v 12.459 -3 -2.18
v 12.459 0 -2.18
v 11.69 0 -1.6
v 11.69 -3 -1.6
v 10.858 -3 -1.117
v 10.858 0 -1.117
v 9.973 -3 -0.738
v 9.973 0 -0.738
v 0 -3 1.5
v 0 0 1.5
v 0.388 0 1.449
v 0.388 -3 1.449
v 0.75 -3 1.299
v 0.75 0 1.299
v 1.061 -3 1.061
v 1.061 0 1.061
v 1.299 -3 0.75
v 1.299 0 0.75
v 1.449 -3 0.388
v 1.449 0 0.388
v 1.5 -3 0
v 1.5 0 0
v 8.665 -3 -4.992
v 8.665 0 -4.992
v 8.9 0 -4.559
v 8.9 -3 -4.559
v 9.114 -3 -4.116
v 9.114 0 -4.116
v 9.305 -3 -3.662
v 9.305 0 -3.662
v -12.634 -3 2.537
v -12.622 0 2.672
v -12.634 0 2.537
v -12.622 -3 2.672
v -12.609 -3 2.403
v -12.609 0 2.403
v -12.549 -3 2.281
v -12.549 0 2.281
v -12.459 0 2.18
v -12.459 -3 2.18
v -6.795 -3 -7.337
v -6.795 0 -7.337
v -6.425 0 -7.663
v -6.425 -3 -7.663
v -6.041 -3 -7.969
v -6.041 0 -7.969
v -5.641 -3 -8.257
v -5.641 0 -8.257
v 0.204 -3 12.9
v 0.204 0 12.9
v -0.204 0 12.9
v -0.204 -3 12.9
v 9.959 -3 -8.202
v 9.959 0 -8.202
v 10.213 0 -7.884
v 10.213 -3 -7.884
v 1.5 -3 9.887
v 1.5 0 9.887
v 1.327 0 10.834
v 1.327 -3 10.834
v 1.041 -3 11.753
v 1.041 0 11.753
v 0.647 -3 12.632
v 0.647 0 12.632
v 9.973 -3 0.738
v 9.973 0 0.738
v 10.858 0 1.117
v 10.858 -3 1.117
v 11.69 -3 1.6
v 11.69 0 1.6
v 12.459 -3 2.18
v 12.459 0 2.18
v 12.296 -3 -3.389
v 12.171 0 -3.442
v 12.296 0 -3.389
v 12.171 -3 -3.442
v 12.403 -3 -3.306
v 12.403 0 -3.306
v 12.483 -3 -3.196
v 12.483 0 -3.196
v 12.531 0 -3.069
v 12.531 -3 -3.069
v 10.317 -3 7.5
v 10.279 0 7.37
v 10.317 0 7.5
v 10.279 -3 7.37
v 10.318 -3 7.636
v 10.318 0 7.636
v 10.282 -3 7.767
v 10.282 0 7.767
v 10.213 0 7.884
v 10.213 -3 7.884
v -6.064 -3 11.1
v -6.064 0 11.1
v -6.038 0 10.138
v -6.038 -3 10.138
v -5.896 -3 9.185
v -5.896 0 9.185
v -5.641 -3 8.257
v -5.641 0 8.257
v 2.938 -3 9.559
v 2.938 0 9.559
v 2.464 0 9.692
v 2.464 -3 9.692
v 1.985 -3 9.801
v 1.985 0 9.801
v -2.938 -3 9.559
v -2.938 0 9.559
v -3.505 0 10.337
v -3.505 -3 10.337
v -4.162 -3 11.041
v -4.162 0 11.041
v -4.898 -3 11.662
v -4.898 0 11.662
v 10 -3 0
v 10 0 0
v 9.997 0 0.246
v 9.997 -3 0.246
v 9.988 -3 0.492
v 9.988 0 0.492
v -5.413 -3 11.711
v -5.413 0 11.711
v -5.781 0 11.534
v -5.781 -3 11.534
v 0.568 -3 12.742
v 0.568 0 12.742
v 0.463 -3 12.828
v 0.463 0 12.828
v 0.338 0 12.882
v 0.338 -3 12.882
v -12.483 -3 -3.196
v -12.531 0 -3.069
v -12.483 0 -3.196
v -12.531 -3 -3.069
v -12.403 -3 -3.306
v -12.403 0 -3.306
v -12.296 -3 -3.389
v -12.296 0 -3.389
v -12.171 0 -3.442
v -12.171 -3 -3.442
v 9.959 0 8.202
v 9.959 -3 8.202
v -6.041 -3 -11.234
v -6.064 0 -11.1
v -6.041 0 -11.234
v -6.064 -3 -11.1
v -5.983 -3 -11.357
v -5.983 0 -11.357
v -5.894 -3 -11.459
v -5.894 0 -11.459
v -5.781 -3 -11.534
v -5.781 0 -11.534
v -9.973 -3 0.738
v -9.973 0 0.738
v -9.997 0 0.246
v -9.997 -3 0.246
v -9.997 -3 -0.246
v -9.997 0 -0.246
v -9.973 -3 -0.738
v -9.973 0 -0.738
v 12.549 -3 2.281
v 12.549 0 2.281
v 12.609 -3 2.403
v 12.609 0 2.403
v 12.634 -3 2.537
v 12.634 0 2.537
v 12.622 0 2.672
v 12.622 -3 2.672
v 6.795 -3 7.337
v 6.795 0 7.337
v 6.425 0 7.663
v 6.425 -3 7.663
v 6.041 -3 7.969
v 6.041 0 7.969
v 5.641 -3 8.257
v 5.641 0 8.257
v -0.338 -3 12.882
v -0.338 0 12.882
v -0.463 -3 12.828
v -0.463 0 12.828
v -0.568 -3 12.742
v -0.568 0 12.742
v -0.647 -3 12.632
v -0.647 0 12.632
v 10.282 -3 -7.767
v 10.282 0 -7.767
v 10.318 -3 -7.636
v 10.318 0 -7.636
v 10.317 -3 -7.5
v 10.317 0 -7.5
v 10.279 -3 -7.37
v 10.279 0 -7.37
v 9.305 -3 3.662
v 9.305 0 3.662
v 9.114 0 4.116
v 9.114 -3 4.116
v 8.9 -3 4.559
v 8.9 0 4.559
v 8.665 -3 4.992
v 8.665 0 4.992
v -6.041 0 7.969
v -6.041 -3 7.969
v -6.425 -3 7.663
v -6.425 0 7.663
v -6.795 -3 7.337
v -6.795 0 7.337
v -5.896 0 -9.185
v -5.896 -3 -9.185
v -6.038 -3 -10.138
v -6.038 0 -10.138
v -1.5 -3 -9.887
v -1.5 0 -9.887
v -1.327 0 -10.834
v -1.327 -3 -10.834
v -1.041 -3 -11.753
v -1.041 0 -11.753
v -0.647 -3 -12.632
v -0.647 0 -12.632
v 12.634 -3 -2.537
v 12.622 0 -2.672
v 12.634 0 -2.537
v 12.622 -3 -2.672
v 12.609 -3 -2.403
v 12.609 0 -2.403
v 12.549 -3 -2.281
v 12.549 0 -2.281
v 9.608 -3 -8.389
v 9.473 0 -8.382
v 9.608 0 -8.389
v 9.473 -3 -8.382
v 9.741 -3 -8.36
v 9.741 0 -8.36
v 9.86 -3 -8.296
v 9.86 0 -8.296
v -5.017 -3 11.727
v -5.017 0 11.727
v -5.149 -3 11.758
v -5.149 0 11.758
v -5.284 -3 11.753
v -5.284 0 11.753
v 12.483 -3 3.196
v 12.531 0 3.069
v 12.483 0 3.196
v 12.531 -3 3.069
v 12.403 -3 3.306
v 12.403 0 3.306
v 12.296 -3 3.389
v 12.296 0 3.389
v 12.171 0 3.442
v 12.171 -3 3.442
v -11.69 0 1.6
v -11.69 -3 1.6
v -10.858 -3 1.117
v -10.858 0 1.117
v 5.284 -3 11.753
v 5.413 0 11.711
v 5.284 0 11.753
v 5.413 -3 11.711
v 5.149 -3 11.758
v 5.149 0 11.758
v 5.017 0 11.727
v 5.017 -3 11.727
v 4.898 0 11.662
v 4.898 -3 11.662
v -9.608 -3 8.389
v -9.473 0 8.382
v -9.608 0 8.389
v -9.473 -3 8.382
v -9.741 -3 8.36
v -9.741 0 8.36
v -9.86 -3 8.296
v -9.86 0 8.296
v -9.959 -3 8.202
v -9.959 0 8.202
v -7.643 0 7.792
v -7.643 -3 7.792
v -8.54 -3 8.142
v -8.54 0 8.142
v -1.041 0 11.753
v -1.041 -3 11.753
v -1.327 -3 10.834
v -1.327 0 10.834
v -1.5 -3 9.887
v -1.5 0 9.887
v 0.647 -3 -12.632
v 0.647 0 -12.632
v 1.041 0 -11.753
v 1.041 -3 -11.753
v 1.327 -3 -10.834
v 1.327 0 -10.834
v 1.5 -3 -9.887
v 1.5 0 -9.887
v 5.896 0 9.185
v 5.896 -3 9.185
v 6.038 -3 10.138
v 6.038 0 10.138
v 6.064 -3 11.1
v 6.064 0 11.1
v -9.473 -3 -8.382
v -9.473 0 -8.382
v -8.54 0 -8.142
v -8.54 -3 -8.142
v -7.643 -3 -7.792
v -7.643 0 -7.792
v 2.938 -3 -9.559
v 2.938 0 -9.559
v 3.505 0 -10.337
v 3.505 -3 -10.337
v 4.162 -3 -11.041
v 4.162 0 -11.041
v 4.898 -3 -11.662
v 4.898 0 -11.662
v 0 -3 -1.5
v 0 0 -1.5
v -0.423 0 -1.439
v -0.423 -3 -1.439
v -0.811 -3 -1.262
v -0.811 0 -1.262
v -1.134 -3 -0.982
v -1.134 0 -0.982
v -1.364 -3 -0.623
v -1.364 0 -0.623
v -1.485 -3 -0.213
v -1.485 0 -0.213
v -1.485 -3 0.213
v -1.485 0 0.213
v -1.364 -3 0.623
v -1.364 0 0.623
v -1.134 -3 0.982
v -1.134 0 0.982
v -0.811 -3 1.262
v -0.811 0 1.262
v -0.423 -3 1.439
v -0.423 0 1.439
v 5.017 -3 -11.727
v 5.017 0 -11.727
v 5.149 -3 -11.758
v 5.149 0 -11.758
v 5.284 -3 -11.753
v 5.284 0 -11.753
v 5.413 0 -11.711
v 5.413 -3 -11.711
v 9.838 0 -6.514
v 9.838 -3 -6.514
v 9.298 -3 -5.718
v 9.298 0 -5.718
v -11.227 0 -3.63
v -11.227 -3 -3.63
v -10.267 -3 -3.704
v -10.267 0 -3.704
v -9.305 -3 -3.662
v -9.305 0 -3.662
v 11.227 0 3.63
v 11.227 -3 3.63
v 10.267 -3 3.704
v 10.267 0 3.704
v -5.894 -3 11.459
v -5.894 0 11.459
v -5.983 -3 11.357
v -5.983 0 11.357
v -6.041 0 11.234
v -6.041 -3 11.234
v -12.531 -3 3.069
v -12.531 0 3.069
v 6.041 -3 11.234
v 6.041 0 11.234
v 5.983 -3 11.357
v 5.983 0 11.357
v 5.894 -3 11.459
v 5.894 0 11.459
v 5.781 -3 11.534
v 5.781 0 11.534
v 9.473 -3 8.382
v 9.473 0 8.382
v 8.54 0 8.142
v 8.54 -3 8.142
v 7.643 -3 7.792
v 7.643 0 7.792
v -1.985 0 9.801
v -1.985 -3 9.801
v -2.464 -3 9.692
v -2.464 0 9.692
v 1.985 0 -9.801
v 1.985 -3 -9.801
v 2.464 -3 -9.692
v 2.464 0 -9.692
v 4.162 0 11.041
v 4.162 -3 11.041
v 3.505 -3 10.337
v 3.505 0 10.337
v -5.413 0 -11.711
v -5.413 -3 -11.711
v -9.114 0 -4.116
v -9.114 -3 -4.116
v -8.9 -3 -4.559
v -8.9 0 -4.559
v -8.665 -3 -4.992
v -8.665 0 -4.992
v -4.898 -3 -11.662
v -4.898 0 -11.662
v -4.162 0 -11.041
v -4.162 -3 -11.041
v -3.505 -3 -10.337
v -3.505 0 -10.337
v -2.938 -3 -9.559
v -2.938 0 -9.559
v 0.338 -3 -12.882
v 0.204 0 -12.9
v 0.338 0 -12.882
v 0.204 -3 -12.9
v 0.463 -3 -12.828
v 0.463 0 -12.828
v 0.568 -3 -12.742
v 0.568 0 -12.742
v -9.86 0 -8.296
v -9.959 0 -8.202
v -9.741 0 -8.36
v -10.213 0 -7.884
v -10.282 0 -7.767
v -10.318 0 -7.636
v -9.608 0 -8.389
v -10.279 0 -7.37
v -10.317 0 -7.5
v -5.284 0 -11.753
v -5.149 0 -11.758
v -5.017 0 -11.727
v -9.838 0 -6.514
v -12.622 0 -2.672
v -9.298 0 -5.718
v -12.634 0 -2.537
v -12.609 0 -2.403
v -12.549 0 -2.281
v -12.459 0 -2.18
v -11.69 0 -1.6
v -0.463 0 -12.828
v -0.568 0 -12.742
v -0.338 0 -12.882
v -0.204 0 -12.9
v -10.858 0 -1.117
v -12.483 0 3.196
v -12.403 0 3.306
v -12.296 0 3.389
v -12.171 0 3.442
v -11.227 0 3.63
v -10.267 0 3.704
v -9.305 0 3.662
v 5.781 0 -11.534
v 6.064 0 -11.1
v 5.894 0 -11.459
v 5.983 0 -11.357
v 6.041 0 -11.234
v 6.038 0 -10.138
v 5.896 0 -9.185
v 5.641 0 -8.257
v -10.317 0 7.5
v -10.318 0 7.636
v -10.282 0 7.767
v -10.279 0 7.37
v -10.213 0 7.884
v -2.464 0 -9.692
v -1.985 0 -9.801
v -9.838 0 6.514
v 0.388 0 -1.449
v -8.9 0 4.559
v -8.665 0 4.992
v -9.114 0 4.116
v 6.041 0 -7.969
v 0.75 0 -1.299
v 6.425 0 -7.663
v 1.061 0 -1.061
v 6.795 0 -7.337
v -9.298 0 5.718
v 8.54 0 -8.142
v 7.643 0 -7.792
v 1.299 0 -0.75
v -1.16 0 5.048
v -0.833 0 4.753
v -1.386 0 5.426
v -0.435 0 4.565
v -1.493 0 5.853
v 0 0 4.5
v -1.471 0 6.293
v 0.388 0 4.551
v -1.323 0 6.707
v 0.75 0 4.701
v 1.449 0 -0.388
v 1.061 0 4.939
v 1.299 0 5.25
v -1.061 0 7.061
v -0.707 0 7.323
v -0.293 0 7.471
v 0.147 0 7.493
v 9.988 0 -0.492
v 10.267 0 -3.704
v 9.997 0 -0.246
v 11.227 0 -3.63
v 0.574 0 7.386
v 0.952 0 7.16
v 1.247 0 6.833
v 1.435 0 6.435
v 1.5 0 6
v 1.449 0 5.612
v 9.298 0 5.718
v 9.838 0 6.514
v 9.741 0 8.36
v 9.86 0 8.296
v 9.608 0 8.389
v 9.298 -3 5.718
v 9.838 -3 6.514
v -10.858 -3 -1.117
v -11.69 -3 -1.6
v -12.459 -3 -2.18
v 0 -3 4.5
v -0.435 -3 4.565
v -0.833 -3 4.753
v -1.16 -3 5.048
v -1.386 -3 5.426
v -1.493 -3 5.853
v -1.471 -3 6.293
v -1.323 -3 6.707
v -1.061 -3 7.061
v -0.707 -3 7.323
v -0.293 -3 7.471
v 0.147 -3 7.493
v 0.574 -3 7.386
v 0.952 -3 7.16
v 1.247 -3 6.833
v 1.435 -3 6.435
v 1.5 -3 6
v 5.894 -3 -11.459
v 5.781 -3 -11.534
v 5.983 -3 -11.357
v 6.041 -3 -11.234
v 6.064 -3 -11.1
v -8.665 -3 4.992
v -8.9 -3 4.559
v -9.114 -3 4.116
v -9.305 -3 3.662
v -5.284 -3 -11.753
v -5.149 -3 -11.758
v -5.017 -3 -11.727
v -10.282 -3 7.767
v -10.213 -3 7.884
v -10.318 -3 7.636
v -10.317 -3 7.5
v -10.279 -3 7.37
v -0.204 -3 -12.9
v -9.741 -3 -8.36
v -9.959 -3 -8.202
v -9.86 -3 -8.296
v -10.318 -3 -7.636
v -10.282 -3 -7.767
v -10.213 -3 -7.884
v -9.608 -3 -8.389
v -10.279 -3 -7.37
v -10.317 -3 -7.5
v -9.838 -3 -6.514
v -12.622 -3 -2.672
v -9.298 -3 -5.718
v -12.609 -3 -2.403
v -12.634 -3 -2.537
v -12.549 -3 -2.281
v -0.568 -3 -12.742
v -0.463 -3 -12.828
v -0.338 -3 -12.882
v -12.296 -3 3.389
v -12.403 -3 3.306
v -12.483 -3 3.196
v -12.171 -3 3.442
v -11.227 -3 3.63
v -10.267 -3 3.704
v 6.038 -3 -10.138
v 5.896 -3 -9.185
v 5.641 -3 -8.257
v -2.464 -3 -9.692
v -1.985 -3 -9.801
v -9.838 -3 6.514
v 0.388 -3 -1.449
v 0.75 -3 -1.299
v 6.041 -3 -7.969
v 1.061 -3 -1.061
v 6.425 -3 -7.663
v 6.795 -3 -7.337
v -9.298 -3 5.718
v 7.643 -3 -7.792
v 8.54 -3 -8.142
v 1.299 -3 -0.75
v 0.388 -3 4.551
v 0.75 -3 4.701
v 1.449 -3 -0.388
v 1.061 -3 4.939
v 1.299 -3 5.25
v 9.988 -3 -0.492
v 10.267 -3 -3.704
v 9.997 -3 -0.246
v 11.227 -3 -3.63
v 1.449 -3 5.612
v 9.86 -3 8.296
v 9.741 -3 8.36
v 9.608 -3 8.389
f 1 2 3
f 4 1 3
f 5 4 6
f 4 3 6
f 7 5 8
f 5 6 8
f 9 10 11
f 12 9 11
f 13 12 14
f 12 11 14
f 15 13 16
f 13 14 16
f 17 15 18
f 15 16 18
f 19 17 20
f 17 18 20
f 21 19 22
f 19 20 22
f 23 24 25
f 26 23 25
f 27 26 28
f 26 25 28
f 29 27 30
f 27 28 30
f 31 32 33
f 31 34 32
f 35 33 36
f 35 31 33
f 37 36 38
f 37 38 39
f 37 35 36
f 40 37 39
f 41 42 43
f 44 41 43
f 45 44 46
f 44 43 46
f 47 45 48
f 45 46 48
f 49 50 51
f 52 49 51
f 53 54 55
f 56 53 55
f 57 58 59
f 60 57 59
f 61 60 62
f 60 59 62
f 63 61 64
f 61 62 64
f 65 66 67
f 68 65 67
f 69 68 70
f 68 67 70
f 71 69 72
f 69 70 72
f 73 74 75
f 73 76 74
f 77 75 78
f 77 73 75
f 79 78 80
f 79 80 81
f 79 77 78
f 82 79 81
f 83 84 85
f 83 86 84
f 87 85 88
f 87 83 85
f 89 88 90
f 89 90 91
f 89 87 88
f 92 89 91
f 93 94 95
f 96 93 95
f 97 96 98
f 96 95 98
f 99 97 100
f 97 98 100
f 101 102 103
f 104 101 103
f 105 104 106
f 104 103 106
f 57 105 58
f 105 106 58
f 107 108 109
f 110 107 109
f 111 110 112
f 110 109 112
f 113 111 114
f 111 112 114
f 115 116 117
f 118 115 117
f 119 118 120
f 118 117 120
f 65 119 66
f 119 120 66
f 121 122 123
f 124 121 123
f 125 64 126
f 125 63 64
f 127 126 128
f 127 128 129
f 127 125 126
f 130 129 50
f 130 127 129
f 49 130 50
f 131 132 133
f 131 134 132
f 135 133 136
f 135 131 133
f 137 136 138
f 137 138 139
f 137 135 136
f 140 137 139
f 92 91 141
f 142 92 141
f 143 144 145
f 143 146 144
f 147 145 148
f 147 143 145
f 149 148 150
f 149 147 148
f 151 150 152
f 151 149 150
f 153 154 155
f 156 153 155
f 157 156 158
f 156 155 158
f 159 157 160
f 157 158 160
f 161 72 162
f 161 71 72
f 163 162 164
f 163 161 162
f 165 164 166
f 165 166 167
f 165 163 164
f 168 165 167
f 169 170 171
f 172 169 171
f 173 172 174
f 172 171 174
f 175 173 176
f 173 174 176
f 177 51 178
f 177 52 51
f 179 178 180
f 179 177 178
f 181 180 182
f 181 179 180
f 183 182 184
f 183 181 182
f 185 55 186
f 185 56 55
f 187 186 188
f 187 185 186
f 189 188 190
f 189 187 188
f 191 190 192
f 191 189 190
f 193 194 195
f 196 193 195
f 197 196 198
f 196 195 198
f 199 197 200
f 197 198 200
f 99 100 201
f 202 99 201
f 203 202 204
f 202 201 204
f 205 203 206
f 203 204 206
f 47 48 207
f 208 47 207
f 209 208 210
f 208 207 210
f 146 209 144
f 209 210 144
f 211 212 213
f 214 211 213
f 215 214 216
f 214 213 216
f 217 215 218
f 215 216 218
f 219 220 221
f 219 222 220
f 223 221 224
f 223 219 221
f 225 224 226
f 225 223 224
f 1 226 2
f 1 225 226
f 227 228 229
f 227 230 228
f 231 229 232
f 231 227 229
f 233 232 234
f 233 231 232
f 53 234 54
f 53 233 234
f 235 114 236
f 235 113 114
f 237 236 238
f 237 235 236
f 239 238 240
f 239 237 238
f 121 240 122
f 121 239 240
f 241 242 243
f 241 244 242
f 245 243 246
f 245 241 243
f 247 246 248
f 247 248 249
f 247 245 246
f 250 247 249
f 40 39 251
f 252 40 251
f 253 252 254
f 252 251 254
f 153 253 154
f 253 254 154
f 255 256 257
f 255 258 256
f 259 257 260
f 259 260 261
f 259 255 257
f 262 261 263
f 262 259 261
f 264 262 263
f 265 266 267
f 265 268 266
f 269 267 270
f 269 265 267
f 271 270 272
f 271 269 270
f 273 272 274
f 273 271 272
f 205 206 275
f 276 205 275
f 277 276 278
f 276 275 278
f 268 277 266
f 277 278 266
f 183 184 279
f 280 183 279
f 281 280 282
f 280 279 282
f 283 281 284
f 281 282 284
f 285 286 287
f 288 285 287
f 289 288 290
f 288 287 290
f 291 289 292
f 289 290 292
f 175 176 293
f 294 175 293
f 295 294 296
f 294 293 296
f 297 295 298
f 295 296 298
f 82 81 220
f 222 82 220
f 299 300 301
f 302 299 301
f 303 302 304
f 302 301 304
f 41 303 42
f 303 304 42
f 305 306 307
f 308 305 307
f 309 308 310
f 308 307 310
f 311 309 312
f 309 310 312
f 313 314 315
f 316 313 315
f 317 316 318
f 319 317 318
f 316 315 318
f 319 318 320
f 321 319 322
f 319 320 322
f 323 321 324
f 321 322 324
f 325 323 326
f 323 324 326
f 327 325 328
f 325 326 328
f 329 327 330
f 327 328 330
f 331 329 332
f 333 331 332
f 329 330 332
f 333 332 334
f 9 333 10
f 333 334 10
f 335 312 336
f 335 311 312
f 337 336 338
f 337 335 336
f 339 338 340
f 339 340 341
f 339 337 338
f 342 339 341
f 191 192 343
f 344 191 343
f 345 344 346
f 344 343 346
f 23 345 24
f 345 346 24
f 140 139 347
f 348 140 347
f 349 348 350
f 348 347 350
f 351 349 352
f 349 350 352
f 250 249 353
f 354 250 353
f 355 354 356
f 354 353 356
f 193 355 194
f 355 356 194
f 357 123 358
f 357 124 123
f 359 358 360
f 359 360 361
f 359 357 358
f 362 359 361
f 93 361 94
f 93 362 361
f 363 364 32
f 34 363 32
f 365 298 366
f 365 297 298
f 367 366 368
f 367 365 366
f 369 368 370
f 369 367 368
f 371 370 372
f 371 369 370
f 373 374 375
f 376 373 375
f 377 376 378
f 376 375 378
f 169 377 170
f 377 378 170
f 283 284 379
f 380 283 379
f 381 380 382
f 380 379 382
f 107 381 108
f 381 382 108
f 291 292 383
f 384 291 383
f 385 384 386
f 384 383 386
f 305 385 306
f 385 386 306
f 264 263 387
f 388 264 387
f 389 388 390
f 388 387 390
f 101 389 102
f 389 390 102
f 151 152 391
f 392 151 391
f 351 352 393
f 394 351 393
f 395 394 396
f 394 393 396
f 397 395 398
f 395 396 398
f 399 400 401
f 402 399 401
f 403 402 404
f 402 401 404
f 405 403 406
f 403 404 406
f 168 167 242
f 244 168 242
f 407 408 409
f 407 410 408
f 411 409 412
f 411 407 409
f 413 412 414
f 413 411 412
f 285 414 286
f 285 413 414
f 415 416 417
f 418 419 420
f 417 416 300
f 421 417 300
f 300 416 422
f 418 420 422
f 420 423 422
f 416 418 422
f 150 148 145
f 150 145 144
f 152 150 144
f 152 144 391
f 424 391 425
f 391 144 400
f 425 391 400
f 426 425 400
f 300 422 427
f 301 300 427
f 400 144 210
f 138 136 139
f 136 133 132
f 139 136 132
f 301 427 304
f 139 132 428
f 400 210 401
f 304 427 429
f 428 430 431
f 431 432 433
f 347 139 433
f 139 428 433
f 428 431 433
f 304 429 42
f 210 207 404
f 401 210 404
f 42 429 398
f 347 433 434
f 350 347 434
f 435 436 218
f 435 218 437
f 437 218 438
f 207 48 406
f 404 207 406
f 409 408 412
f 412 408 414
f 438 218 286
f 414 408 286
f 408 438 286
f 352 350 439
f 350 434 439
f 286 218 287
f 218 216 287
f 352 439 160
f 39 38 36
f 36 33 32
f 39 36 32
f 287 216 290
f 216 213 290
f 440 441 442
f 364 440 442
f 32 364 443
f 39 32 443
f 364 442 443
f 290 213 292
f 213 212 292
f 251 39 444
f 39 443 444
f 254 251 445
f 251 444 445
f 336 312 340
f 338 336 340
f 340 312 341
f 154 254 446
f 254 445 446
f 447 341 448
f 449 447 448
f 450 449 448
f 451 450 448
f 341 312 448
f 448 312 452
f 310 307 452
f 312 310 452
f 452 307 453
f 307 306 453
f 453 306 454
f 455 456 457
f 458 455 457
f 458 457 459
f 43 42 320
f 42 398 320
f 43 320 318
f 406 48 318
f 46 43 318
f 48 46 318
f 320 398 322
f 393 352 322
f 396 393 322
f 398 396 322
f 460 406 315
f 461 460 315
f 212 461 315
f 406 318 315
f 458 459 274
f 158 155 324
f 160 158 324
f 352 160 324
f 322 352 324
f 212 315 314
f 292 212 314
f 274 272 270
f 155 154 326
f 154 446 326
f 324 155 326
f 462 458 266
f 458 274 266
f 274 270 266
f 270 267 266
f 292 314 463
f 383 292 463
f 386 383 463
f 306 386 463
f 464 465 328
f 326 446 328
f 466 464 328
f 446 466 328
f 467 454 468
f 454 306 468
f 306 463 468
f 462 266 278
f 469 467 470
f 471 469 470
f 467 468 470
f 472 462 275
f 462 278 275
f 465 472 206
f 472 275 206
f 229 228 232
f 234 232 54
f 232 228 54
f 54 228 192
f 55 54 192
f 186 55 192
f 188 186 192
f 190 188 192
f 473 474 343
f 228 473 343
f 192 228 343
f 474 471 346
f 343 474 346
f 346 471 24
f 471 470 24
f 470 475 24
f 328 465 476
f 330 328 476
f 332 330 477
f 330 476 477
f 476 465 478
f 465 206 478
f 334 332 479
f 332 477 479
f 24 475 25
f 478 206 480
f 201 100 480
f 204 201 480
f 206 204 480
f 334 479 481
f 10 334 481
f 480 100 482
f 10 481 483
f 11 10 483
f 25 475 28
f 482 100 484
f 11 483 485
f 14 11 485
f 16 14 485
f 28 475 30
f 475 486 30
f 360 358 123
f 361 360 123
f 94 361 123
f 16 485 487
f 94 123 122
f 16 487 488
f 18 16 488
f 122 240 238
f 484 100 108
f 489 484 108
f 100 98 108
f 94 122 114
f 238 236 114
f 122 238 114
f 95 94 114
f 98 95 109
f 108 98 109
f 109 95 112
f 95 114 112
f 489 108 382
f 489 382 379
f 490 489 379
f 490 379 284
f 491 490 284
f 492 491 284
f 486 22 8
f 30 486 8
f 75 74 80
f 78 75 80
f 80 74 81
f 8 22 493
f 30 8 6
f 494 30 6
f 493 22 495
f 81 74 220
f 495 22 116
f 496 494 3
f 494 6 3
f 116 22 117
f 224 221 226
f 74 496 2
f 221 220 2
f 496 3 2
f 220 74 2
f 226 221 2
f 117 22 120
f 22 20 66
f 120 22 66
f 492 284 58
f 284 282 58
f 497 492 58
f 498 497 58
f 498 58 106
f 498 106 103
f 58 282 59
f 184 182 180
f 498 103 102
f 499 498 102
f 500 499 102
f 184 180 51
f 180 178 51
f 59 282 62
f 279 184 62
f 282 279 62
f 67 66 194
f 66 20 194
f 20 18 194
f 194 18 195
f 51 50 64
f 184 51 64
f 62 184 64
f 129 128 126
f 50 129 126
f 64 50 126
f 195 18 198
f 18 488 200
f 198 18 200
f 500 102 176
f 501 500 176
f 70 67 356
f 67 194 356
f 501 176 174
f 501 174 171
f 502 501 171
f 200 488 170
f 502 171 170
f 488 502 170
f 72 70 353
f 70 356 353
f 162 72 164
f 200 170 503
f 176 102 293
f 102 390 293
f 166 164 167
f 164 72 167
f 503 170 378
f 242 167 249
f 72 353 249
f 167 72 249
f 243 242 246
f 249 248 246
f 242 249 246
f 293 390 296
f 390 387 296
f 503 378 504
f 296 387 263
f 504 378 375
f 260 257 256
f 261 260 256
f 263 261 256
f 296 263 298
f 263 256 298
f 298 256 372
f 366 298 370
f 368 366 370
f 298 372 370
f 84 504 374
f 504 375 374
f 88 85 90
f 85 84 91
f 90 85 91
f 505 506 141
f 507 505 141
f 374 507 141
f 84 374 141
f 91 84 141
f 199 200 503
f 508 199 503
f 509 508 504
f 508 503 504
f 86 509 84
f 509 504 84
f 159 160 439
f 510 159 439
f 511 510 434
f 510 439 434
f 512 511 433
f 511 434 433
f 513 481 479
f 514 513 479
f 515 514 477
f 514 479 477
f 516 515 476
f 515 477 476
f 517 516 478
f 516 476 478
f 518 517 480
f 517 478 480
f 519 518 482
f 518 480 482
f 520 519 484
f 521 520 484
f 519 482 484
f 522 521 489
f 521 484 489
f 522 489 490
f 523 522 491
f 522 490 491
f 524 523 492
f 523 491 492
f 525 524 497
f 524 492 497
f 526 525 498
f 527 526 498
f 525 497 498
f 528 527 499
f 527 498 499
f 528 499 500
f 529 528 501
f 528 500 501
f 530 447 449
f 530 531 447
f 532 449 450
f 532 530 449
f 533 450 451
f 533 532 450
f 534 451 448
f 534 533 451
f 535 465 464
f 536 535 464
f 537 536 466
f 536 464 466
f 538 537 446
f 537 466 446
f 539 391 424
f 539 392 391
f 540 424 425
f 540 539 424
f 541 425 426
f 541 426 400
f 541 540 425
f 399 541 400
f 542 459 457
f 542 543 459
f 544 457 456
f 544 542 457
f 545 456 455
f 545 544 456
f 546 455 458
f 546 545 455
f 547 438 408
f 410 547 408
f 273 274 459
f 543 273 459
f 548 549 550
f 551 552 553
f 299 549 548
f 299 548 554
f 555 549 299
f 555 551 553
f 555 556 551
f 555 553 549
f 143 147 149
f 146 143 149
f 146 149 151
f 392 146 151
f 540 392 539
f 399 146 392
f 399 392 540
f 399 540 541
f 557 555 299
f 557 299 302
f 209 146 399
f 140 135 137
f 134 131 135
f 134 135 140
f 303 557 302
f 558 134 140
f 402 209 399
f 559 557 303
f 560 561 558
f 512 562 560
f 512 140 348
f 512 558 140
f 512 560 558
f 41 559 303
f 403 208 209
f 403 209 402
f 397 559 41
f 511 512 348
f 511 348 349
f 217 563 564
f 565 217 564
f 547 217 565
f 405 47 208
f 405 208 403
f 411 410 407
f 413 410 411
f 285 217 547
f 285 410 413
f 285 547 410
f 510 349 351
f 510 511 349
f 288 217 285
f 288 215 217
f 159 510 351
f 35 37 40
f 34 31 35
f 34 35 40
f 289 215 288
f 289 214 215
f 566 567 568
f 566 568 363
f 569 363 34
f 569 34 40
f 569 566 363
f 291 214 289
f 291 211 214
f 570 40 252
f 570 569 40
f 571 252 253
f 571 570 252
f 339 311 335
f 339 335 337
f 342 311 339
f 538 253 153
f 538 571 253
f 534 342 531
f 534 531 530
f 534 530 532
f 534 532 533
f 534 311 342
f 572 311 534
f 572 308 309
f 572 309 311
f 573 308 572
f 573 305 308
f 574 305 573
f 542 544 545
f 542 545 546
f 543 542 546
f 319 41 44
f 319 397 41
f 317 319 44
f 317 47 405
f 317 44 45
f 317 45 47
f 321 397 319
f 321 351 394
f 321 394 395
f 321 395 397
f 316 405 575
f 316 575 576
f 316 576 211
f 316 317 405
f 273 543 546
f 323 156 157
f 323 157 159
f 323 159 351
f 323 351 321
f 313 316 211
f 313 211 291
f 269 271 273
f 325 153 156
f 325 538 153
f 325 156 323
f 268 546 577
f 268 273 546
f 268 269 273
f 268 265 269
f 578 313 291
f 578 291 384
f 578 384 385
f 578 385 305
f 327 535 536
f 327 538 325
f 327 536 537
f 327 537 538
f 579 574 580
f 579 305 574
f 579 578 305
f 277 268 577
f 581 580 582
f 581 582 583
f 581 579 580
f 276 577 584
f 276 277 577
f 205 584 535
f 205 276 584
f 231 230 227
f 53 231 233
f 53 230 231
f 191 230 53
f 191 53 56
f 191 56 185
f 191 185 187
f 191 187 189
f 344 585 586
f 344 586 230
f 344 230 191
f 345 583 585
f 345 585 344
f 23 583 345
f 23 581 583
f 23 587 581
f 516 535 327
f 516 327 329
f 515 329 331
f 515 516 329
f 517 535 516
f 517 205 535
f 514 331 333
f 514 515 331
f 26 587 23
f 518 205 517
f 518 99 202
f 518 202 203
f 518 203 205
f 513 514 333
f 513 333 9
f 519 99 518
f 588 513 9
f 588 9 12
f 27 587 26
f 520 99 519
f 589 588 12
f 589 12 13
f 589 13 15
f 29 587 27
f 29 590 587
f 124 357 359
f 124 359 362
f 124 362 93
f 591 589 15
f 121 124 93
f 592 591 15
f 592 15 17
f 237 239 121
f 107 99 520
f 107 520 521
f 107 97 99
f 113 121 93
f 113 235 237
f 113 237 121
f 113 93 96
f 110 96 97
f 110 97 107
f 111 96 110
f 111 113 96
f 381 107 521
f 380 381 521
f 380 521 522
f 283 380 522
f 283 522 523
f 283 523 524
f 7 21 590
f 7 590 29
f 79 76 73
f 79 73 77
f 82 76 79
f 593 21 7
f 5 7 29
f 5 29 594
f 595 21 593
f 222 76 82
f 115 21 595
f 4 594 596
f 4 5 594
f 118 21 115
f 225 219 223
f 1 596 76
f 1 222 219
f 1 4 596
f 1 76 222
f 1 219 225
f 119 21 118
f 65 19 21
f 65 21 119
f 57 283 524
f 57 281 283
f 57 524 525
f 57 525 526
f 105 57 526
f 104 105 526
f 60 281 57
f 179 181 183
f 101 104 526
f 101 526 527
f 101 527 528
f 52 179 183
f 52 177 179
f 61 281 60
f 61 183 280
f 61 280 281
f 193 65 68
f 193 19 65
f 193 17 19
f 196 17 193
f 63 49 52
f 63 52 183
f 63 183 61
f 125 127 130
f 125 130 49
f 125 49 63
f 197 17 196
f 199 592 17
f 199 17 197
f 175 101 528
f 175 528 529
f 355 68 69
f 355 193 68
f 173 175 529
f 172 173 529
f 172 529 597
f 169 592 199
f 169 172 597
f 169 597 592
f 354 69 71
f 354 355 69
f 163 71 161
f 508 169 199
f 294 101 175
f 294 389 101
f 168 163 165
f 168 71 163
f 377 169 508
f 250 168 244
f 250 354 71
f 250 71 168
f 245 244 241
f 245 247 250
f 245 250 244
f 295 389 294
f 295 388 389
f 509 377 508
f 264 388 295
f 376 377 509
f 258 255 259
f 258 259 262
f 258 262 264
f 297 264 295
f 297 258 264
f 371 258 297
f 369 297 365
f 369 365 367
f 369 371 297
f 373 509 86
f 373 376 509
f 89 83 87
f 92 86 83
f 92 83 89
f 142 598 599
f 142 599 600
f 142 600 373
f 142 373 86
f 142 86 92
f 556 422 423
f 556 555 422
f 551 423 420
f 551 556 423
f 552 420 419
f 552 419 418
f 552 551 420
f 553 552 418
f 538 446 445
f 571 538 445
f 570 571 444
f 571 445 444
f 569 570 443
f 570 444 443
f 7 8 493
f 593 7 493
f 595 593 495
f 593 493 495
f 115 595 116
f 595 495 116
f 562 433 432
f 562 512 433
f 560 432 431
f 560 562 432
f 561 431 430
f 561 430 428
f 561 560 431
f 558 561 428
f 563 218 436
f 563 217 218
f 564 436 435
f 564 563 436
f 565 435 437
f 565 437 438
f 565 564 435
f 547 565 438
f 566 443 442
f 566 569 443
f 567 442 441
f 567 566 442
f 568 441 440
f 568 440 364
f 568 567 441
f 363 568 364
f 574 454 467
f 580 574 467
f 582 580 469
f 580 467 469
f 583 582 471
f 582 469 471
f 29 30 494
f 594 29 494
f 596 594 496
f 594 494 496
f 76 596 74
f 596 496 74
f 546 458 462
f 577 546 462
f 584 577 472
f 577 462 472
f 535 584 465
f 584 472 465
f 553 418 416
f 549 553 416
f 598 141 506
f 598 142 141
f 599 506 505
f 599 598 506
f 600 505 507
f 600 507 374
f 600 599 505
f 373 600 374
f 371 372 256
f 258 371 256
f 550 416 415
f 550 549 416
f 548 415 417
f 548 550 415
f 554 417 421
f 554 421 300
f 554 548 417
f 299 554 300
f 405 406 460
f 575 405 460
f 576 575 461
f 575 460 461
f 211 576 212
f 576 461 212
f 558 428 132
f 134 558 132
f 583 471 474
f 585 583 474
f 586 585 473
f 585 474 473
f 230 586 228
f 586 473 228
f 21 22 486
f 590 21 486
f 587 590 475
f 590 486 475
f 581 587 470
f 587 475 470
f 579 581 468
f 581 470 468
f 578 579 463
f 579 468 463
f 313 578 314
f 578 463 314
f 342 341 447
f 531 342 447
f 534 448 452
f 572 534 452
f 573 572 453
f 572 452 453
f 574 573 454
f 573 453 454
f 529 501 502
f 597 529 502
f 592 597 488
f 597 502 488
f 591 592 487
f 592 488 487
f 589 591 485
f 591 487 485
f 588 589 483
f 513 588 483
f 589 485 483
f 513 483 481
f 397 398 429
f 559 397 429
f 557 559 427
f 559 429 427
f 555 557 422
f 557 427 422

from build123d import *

# Parameters (mm, degrees)
F1_DEPTH = 3
F2_R     = 0.5


# Not quite as in the source:
# - a feature names something its author has since deleted; it is built from what else it names


with BuildPart() as f1:
    # F0 (on Front) → F1 (new body)
    with BuildSketch(Plane.XZ):
        with BuildLine():
            ThreePointArc((9.9727571462, -0.7376414454), (9.9931869657, -0.3690721728), (10, 0))
            ThreePointArc((10, 0), (9.9931869657, 0.3690721728), (9.9727571462, 0.7376414454))
            ThreePointArc((9.9727571462, 0.7376414454), (9.7492791218, 2.2252093396), (9.3051943444, 3.6624251819))
            ThreePointArc((9.3051943444, 3.6624251819), (9.009688679, 4.3388373912), (8.6650930875, 4.9916091379))
            ThreePointArc((8.6650930875, 4.9916091379), (7.8183148247, 6.2348980186), (6.7946236819, 7.3371035853))
            ThreePointArc((6.7946236819, 7.3371035853), (6.2348980186, 7.8183148247), (5.6412010723, 8.2569274226))
            ThreePointArc((5.6412010723, 8.2569274226), (4.3388373912, 9.009688679), (2.9382944686, 9.5585786399))
            ThreePointArc((2.9382944686, 9.5585786399), (2.2252093396, 9.7492791218), (1.5, 9.8868599666))
            ThreePointArc((1.5, 9.8868599666), (0, 10), (-1.5, 9.8868599666))
            ThreePointArc((-1.5, 9.8868599666), (-2.2252093396, 9.7492791218), (-2.9382944686, 9.5585786399))
            ThreePointArc((-2.9382944686, 9.5585786399), (-4.3388373912, 9.009688679), (-5.6412010723, 8.2569274226))
            ThreePointArc((-5.6412010723, 8.2569274226), (-6.2348980186, 7.8183148247), (-6.7946236819, 7.3371035853))
            ThreePointArc((-6.7946236819, 7.3371035853), (-7.8183148247, 6.2348980186), (-8.6650930875, 4.9916091379))
            ThreePointArc((-8.6650930875, 4.9916091379), (-9.009688679, 4.3388373912), (-9.3051943444, 3.6624251819))
            ThreePointArc((-9.3051943444, 3.6624251819), (-9.7492791218, 2.2252093396), (-9.9727571462, 0.7376414454))
            ThreePointArc((-9.9727571462, 0.7376414454), (-10, 0), (-9.9727571462, -0.7376414454))
            ThreePointArc((-9.9727571462, -0.7376414454), (-9.7492791218, -2.2252093396), (-9.3051943444, -3.6624251819))
            ThreePointArc((-9.3051943444, -3.6624251819), (-9.009688679, -4.3388373912), (-8.6650930875, -4.9916091379))
            ThreePointArc((-8.6650930875, -4.9916091379), (-7.8183148247, -6.2348980186), (-6.7946236819, -7.3371035853))
            ThreePointArc((-6.7946236819, -7.3371035853), (-6.2348980186, -7.8183148247), (-5.6412010723, -8.2569274226))
            ThreePointArc((-5.6412010723, -8.2569274226), (-4.3388373912, -9.009688679), (-2.9382944686, -9.5585786399))
            ThreePointArc((-2.9382944686, -9.5585786399), (-2.2252093396, -9.7492791218), (-1.5, -9.8868599666))
            ThreePointArc((-1.5, -9.8868599666), (0, -10), (1.5, -9.8868599666))
            ThreePointArc((1.5, -9.8868599666), (2.2252093396, -9.7492791218), (2.9382944686, -9.5585786399))
            ThreePointArc((2.9382944686, -9.5585786399), (4.3388373912, -9.009688679), (5.6412010723, -8.2569274226))
            ThreePointArc((5.6412010723, -8.2569274226), (6.2348980186, -7.8183148247), (6.7946236819, -7.3371035853))
            ThreePointArc((6.7946236819, -7.3371035853), (7.8183148247, -6.2348980186), (8.6650930875, -4.9916091379))
            ThreePointArc((8.6650930875, -4.9916091379), (9.009688679, -4.3388373912), (9.3051943444, -3.6624251819))
            ThreePointArc((9.3051943444, -3.6624251819), (9.7492791218, -2.2252093396), (9.9727571462, -0.7376414454))
        make_face()
        with BuildLine():
            ThreePointArc((0, 1.5), (1.0606601718, 1.0606601718), (1.5, 0))
            ThreePointArc((1.5, 0), (1.0606601718, -1.0606601718), (0, -1.5))
            ThreePointArc((0, -1.5), (-1.5, 0), (0, 1.5))
        make_face(mode=Mode.SUBTRACT)
        with BuildLine():
            ThreePointArc((1.5, 6), (1.0606601718, 4.9393398282), (0, 4.5))
            ThreePointArc((0, 4.5), (-1.0606601718, 7.0606601718), (1.5, 6))
        make_face(mode=Mode.SUBTRACT)
        with BuildLine():
            ThreePointArc((-5.6412010723, 8.2569274226), (-4.3388373912, 9.009688679), (-2.9382944686, 9.5585786399))
            ThreePointArc((-2.9382944686, 9.5585786399), (-3.9281759427, 10.8096541208), (-5.1466158007, 11.8394402655))
            Line((-5.1466158007, 11.8394402655), (-6.0475846686, 11.4055565264))
            ThreePointArc((-6.0475846686, 11.4055565264), (-6.002150266, 9.8108807266), (-5.6412010723, 8.2569274226))
        make_face()
        with BuildLine():
            ThreePointArc((-1.5, 9.8868599666), (0, 10), (1.5, 9.8868599666))
            ThreePointArc((1.5, 9.8868599666), (1.1509689165, 11.4435335015), (0.5, 12.9))
            Line((0.5, 12.9), (-0.5, 12.9))
            ThreePointArc((-0.5, 12.9), (-1.1509689165, 11.4435335015), (-1.5, 9.8868599666))
        make_face()
        with BuildLine():
            ThreePointArc((-8.6650930875, 4.9916091379), (-7.8183148247, 6.2348980186), (-6.7946236819, 7.3371035853))
            ThreePointArc((-6.7946236819, 7.3371035853), (-8.2292973805, 8.0347901697), (-9.7738812229, 8.4339341852))
            Line((-9.7738812229, 8.4339341852), (-10.3973710248, 7.6521027027))
            ThreePointArc((-10.3973710248, 7.6521027027), (-9.6645321438, 6.2350627012), (-8.6650930875, 4.9916091379))
        make_face()
        with BuildLine():
            ThreePointArc((-9.9727571462, 0.7376414454), (-9.7492791218, 2.2252093396), (-9.3051943444, 3.6624251819))
            ThreePointArc((-9.3051943444, 3.6624251819), (-10.9005055464, 3.6685374852), (-12.4653096002, 3.3579840041))
            Line((-12.4653096002, 3.3579840041), (-12.6878305341, 2.3830560919))
            ThreePointArc((-12.6878305341, 2.3830560919), (-11.4127349029, 1.4243140398), (-9.9727571462, 0.7376414454))
        make_face()
        with BuildLine():
            ThreePointArc((-12.4653096002, -3.3579840041), (-10.9005055464, -3.6685374852), (-9.3051943444, -3.6624251819))
            ThreePointArc((-9.3051943444, -3.6624251819), (-9.7492791218, -2.2252093396), (-9.9727571462, -0.7376414454))
            ThreePointArc((-9.9727571462, -0.7376414454), (-11.4127349029, -1.4243140398), (-12.6878305341, -2.3830560919))
            Line((-12.6878305341, -2.3830560919), (-12.4653096002, -3.3579840041))
        make_face()
        with BuildLine():
            ThreePointArc((-9.7738812229, -8.4339341852), (-8.2292973805, -8.0347901697), (-6.7946236819, -7.3371035853))
            ThreePointArc((-6.7946236819, -7.3371035853), (-7.8183148247, -6.2348980186), (-8.6650930875, -4.9916091379))
            ThreePointArc((-8.6650930875, -4.9916091379), (-9.6645321438, -6.2350627012), (-10.3973710248, -7.6521027027))
            Line((-10.3973710248, -7.6521027027), (-9.7738812229, -8.4339341852))
        make_face()
        with BuildLine():
            ThreePointArc((-5.1466158007, -11.8394402655), (-3.9281759427, -10.8096541208), (-2.9382944686, -9.5585786399))
            ThreePointArc((-2.9382944686, -9.5585786399), (-4.3388373912, -9.009688679), (-5.6412010723, -8.2569274226))
            ThreePointArc((-5.6412010723, -8.2569274226), (-6.002150266, -9.8108807266), (-6.0475846686, -11.4055565264))
            Line((-6.0475846686, -11.4055565264), (-5.1466158007, -11.8394402655))
        make_face()
        with BuildLine():
            ThreePointArc((0.5, -12.9), (1.1509689165, -11.4435335015), (1.5, -9.8868599666))
            ThreePointArc((1.5, -9.8868599666), (0, -10), (-1.5, -9.8868599666))
            ThreePointArc((-1.5, -9.8868599666), (-1.1509689165, -11.4435335015), (-0.5, -12.9))
            Line((-0.5, -12.9), (0.5, -12.9))
        make_face()
        with BuildLine():
            ThreePointArc((6.0475846686, -11.4055565264), (6.002150266, -9.8108807266), (5.6412010723, -8.2569274226))
            ThreePointArc((5.6412010723, -8.2569274226), (4.3388373912, -9.009688679), (2.9382944686, -9.5585786399))
            ThreePointArc((2.9382944686, -9.5585786399), (3.9281759427, -10.8096541208), (5.1466158007, -11.8394402655))
            Line((5.1466158007, -11.8394402655), (6.0475846686, -11.4055565264))
        make_face()
        with BuildLine():
            ThreePointArc((10.3973710248, -7.6521027027), (9.6645321438, -6.2350627012), (8.6650930875, -4.9916091379))
            ThreePointArc((8.6650930875, -4.9916091379), (7.8183148247, -6.2348980186), (6.7946236819, -7.3371035853))
            ThreePointArc((6.7946236819, -7.3371035853), (8.2292973805, -8.0347901697), (9.7738812229, -8.4339341852))
            Line((9.7738812229, -8.4339341852), (10.3973710248, -7.6521027027))
        make_face()
        with BuildLine():
            ThreePointArc((12.6878305341, -2.3830560919), (11.4127349029, -1.4243140398), (9.9727571462, -0.7376414454))
            ThreePointArc((9.9727571462, -0.7376414454), (9.7492791218, -2.2252093396), (9.3051943444, -3.6624251819))
            ThreePointArc((9.3051943444, -3.6624251819), (10.9005055464, -3.6685374852), (12.4653096002, -3.3579840041))
            Line((12.4653096002, -3.3579840041), (12.6878305341, -2.3830560919))
        make_face()
        with BuildLine():
            ThreePointArc((9.3051943444, 3.6624251819), (9.7492791218, 2.2252093396), (9.9727571462, 0.7376414454))
            ThreePointArc((9.9727571462, 0.7376414454), (11.4127349029, 1.4243140398), (12.6878305341, 2.3830560919))
            Line((12.6878305341, 2.3830560919), (12.4653096002, 3.3579840041))
            ThreePointArc((12.4653096002, 3.3579840041), (10.9005055464, 3.6685374852), (9.3051943444, 3.6624251819))
        make_face()
        with BuildLine():
            ThreePointArc((6.7946236819, 7.3371035853), (7.8183148247, 6.2348980186), (8.6650930875, 4.9916091379))
            ThreePointArc((8.6650930875, 4.9916091379), (9.6645321438, 6.2350627012), (10.3973710248, 7.6521027027))
            Line((10.3973710248, 7.6521027027), (9.7738812229, 8.4339341852))
            ThreePointArc((9.7738812229, 8.4339341852), (8.2292973805, 8.0347901697), (6.7946236819, 7.3371035853))
        make_face()
        with BuildLine():
            ThreePointArc((2.9382944686, 9.5585786399), (4.3388373912, 9.009688679), (5.6412010723, 8.2569274226))
            ThreePointArc((5.6412010723, 8.2569274226), (6.002150266, 9.8108807266), (6.0475846686, 11.4055565264))
            Line((6.0475846686, 11.4055565264), (5.1466158007, 11.8394402655))
            ThreePointArc((5.1466158007, 11.8394402655), (3.9281759427, 10.8096541208), (2.9382944686, 9.5585786399))
        make_face()
    extrude(amount=F1_DEPTH)

    # F2
    f2_edges = [f1.edges().sort_by_distance(p)[0] for p in [
        (-5.146616, -1.5, 11.83944),
        (-6.047585, -1.5, 11.405557),
        (-9.773881, -1.5, 8.433934),
        (-10.397371, -1.5, 7.652103),
        (-0.5, -1.5, 12.9),
        (0.5, -1.5, 12.9),
        (5.146616, -1.5, 11.83944),
        (6.047585, -1.5, 11.405557),
        (9.773881, -1.5, 8.433934),
        (10.397371, -1.5, 7.652103),
        (12.46531, -1.5, 3.357984),
        (12.687831, -1.5, 2.383056),
        (12.687831, -1.5, -2.383056),
        (12.46531, -1.5, -3.357984),
        (10.397371, -1.5, -7.652103),
        (9.773881, -1.5, -8.433934),
        (6.047585, -1.5, -11.405557),
        (5.146616, -1.5, -11.83944),
        (0.5, -1.5, -12.9),
        (-0.5, -1.5, -12.9),
        (-5.146616, -1.5, -11.83944),
        (-6.047585, -1.5, -11.405557),
        (-12.46531, -1.5, 3.357984),
        (-12.687831, -1.5, 2.383056),
        (-12.687831, -1.5, -2.383056),
        (-12.46531, -1.5, -3.357984),
        (-9.773881, -1.5, -8.433934),
        (-10.397371, -1.5, -7.652103),
    ]]
    fillet(f2_edges, radius=F2_R)


solid = f1.part
